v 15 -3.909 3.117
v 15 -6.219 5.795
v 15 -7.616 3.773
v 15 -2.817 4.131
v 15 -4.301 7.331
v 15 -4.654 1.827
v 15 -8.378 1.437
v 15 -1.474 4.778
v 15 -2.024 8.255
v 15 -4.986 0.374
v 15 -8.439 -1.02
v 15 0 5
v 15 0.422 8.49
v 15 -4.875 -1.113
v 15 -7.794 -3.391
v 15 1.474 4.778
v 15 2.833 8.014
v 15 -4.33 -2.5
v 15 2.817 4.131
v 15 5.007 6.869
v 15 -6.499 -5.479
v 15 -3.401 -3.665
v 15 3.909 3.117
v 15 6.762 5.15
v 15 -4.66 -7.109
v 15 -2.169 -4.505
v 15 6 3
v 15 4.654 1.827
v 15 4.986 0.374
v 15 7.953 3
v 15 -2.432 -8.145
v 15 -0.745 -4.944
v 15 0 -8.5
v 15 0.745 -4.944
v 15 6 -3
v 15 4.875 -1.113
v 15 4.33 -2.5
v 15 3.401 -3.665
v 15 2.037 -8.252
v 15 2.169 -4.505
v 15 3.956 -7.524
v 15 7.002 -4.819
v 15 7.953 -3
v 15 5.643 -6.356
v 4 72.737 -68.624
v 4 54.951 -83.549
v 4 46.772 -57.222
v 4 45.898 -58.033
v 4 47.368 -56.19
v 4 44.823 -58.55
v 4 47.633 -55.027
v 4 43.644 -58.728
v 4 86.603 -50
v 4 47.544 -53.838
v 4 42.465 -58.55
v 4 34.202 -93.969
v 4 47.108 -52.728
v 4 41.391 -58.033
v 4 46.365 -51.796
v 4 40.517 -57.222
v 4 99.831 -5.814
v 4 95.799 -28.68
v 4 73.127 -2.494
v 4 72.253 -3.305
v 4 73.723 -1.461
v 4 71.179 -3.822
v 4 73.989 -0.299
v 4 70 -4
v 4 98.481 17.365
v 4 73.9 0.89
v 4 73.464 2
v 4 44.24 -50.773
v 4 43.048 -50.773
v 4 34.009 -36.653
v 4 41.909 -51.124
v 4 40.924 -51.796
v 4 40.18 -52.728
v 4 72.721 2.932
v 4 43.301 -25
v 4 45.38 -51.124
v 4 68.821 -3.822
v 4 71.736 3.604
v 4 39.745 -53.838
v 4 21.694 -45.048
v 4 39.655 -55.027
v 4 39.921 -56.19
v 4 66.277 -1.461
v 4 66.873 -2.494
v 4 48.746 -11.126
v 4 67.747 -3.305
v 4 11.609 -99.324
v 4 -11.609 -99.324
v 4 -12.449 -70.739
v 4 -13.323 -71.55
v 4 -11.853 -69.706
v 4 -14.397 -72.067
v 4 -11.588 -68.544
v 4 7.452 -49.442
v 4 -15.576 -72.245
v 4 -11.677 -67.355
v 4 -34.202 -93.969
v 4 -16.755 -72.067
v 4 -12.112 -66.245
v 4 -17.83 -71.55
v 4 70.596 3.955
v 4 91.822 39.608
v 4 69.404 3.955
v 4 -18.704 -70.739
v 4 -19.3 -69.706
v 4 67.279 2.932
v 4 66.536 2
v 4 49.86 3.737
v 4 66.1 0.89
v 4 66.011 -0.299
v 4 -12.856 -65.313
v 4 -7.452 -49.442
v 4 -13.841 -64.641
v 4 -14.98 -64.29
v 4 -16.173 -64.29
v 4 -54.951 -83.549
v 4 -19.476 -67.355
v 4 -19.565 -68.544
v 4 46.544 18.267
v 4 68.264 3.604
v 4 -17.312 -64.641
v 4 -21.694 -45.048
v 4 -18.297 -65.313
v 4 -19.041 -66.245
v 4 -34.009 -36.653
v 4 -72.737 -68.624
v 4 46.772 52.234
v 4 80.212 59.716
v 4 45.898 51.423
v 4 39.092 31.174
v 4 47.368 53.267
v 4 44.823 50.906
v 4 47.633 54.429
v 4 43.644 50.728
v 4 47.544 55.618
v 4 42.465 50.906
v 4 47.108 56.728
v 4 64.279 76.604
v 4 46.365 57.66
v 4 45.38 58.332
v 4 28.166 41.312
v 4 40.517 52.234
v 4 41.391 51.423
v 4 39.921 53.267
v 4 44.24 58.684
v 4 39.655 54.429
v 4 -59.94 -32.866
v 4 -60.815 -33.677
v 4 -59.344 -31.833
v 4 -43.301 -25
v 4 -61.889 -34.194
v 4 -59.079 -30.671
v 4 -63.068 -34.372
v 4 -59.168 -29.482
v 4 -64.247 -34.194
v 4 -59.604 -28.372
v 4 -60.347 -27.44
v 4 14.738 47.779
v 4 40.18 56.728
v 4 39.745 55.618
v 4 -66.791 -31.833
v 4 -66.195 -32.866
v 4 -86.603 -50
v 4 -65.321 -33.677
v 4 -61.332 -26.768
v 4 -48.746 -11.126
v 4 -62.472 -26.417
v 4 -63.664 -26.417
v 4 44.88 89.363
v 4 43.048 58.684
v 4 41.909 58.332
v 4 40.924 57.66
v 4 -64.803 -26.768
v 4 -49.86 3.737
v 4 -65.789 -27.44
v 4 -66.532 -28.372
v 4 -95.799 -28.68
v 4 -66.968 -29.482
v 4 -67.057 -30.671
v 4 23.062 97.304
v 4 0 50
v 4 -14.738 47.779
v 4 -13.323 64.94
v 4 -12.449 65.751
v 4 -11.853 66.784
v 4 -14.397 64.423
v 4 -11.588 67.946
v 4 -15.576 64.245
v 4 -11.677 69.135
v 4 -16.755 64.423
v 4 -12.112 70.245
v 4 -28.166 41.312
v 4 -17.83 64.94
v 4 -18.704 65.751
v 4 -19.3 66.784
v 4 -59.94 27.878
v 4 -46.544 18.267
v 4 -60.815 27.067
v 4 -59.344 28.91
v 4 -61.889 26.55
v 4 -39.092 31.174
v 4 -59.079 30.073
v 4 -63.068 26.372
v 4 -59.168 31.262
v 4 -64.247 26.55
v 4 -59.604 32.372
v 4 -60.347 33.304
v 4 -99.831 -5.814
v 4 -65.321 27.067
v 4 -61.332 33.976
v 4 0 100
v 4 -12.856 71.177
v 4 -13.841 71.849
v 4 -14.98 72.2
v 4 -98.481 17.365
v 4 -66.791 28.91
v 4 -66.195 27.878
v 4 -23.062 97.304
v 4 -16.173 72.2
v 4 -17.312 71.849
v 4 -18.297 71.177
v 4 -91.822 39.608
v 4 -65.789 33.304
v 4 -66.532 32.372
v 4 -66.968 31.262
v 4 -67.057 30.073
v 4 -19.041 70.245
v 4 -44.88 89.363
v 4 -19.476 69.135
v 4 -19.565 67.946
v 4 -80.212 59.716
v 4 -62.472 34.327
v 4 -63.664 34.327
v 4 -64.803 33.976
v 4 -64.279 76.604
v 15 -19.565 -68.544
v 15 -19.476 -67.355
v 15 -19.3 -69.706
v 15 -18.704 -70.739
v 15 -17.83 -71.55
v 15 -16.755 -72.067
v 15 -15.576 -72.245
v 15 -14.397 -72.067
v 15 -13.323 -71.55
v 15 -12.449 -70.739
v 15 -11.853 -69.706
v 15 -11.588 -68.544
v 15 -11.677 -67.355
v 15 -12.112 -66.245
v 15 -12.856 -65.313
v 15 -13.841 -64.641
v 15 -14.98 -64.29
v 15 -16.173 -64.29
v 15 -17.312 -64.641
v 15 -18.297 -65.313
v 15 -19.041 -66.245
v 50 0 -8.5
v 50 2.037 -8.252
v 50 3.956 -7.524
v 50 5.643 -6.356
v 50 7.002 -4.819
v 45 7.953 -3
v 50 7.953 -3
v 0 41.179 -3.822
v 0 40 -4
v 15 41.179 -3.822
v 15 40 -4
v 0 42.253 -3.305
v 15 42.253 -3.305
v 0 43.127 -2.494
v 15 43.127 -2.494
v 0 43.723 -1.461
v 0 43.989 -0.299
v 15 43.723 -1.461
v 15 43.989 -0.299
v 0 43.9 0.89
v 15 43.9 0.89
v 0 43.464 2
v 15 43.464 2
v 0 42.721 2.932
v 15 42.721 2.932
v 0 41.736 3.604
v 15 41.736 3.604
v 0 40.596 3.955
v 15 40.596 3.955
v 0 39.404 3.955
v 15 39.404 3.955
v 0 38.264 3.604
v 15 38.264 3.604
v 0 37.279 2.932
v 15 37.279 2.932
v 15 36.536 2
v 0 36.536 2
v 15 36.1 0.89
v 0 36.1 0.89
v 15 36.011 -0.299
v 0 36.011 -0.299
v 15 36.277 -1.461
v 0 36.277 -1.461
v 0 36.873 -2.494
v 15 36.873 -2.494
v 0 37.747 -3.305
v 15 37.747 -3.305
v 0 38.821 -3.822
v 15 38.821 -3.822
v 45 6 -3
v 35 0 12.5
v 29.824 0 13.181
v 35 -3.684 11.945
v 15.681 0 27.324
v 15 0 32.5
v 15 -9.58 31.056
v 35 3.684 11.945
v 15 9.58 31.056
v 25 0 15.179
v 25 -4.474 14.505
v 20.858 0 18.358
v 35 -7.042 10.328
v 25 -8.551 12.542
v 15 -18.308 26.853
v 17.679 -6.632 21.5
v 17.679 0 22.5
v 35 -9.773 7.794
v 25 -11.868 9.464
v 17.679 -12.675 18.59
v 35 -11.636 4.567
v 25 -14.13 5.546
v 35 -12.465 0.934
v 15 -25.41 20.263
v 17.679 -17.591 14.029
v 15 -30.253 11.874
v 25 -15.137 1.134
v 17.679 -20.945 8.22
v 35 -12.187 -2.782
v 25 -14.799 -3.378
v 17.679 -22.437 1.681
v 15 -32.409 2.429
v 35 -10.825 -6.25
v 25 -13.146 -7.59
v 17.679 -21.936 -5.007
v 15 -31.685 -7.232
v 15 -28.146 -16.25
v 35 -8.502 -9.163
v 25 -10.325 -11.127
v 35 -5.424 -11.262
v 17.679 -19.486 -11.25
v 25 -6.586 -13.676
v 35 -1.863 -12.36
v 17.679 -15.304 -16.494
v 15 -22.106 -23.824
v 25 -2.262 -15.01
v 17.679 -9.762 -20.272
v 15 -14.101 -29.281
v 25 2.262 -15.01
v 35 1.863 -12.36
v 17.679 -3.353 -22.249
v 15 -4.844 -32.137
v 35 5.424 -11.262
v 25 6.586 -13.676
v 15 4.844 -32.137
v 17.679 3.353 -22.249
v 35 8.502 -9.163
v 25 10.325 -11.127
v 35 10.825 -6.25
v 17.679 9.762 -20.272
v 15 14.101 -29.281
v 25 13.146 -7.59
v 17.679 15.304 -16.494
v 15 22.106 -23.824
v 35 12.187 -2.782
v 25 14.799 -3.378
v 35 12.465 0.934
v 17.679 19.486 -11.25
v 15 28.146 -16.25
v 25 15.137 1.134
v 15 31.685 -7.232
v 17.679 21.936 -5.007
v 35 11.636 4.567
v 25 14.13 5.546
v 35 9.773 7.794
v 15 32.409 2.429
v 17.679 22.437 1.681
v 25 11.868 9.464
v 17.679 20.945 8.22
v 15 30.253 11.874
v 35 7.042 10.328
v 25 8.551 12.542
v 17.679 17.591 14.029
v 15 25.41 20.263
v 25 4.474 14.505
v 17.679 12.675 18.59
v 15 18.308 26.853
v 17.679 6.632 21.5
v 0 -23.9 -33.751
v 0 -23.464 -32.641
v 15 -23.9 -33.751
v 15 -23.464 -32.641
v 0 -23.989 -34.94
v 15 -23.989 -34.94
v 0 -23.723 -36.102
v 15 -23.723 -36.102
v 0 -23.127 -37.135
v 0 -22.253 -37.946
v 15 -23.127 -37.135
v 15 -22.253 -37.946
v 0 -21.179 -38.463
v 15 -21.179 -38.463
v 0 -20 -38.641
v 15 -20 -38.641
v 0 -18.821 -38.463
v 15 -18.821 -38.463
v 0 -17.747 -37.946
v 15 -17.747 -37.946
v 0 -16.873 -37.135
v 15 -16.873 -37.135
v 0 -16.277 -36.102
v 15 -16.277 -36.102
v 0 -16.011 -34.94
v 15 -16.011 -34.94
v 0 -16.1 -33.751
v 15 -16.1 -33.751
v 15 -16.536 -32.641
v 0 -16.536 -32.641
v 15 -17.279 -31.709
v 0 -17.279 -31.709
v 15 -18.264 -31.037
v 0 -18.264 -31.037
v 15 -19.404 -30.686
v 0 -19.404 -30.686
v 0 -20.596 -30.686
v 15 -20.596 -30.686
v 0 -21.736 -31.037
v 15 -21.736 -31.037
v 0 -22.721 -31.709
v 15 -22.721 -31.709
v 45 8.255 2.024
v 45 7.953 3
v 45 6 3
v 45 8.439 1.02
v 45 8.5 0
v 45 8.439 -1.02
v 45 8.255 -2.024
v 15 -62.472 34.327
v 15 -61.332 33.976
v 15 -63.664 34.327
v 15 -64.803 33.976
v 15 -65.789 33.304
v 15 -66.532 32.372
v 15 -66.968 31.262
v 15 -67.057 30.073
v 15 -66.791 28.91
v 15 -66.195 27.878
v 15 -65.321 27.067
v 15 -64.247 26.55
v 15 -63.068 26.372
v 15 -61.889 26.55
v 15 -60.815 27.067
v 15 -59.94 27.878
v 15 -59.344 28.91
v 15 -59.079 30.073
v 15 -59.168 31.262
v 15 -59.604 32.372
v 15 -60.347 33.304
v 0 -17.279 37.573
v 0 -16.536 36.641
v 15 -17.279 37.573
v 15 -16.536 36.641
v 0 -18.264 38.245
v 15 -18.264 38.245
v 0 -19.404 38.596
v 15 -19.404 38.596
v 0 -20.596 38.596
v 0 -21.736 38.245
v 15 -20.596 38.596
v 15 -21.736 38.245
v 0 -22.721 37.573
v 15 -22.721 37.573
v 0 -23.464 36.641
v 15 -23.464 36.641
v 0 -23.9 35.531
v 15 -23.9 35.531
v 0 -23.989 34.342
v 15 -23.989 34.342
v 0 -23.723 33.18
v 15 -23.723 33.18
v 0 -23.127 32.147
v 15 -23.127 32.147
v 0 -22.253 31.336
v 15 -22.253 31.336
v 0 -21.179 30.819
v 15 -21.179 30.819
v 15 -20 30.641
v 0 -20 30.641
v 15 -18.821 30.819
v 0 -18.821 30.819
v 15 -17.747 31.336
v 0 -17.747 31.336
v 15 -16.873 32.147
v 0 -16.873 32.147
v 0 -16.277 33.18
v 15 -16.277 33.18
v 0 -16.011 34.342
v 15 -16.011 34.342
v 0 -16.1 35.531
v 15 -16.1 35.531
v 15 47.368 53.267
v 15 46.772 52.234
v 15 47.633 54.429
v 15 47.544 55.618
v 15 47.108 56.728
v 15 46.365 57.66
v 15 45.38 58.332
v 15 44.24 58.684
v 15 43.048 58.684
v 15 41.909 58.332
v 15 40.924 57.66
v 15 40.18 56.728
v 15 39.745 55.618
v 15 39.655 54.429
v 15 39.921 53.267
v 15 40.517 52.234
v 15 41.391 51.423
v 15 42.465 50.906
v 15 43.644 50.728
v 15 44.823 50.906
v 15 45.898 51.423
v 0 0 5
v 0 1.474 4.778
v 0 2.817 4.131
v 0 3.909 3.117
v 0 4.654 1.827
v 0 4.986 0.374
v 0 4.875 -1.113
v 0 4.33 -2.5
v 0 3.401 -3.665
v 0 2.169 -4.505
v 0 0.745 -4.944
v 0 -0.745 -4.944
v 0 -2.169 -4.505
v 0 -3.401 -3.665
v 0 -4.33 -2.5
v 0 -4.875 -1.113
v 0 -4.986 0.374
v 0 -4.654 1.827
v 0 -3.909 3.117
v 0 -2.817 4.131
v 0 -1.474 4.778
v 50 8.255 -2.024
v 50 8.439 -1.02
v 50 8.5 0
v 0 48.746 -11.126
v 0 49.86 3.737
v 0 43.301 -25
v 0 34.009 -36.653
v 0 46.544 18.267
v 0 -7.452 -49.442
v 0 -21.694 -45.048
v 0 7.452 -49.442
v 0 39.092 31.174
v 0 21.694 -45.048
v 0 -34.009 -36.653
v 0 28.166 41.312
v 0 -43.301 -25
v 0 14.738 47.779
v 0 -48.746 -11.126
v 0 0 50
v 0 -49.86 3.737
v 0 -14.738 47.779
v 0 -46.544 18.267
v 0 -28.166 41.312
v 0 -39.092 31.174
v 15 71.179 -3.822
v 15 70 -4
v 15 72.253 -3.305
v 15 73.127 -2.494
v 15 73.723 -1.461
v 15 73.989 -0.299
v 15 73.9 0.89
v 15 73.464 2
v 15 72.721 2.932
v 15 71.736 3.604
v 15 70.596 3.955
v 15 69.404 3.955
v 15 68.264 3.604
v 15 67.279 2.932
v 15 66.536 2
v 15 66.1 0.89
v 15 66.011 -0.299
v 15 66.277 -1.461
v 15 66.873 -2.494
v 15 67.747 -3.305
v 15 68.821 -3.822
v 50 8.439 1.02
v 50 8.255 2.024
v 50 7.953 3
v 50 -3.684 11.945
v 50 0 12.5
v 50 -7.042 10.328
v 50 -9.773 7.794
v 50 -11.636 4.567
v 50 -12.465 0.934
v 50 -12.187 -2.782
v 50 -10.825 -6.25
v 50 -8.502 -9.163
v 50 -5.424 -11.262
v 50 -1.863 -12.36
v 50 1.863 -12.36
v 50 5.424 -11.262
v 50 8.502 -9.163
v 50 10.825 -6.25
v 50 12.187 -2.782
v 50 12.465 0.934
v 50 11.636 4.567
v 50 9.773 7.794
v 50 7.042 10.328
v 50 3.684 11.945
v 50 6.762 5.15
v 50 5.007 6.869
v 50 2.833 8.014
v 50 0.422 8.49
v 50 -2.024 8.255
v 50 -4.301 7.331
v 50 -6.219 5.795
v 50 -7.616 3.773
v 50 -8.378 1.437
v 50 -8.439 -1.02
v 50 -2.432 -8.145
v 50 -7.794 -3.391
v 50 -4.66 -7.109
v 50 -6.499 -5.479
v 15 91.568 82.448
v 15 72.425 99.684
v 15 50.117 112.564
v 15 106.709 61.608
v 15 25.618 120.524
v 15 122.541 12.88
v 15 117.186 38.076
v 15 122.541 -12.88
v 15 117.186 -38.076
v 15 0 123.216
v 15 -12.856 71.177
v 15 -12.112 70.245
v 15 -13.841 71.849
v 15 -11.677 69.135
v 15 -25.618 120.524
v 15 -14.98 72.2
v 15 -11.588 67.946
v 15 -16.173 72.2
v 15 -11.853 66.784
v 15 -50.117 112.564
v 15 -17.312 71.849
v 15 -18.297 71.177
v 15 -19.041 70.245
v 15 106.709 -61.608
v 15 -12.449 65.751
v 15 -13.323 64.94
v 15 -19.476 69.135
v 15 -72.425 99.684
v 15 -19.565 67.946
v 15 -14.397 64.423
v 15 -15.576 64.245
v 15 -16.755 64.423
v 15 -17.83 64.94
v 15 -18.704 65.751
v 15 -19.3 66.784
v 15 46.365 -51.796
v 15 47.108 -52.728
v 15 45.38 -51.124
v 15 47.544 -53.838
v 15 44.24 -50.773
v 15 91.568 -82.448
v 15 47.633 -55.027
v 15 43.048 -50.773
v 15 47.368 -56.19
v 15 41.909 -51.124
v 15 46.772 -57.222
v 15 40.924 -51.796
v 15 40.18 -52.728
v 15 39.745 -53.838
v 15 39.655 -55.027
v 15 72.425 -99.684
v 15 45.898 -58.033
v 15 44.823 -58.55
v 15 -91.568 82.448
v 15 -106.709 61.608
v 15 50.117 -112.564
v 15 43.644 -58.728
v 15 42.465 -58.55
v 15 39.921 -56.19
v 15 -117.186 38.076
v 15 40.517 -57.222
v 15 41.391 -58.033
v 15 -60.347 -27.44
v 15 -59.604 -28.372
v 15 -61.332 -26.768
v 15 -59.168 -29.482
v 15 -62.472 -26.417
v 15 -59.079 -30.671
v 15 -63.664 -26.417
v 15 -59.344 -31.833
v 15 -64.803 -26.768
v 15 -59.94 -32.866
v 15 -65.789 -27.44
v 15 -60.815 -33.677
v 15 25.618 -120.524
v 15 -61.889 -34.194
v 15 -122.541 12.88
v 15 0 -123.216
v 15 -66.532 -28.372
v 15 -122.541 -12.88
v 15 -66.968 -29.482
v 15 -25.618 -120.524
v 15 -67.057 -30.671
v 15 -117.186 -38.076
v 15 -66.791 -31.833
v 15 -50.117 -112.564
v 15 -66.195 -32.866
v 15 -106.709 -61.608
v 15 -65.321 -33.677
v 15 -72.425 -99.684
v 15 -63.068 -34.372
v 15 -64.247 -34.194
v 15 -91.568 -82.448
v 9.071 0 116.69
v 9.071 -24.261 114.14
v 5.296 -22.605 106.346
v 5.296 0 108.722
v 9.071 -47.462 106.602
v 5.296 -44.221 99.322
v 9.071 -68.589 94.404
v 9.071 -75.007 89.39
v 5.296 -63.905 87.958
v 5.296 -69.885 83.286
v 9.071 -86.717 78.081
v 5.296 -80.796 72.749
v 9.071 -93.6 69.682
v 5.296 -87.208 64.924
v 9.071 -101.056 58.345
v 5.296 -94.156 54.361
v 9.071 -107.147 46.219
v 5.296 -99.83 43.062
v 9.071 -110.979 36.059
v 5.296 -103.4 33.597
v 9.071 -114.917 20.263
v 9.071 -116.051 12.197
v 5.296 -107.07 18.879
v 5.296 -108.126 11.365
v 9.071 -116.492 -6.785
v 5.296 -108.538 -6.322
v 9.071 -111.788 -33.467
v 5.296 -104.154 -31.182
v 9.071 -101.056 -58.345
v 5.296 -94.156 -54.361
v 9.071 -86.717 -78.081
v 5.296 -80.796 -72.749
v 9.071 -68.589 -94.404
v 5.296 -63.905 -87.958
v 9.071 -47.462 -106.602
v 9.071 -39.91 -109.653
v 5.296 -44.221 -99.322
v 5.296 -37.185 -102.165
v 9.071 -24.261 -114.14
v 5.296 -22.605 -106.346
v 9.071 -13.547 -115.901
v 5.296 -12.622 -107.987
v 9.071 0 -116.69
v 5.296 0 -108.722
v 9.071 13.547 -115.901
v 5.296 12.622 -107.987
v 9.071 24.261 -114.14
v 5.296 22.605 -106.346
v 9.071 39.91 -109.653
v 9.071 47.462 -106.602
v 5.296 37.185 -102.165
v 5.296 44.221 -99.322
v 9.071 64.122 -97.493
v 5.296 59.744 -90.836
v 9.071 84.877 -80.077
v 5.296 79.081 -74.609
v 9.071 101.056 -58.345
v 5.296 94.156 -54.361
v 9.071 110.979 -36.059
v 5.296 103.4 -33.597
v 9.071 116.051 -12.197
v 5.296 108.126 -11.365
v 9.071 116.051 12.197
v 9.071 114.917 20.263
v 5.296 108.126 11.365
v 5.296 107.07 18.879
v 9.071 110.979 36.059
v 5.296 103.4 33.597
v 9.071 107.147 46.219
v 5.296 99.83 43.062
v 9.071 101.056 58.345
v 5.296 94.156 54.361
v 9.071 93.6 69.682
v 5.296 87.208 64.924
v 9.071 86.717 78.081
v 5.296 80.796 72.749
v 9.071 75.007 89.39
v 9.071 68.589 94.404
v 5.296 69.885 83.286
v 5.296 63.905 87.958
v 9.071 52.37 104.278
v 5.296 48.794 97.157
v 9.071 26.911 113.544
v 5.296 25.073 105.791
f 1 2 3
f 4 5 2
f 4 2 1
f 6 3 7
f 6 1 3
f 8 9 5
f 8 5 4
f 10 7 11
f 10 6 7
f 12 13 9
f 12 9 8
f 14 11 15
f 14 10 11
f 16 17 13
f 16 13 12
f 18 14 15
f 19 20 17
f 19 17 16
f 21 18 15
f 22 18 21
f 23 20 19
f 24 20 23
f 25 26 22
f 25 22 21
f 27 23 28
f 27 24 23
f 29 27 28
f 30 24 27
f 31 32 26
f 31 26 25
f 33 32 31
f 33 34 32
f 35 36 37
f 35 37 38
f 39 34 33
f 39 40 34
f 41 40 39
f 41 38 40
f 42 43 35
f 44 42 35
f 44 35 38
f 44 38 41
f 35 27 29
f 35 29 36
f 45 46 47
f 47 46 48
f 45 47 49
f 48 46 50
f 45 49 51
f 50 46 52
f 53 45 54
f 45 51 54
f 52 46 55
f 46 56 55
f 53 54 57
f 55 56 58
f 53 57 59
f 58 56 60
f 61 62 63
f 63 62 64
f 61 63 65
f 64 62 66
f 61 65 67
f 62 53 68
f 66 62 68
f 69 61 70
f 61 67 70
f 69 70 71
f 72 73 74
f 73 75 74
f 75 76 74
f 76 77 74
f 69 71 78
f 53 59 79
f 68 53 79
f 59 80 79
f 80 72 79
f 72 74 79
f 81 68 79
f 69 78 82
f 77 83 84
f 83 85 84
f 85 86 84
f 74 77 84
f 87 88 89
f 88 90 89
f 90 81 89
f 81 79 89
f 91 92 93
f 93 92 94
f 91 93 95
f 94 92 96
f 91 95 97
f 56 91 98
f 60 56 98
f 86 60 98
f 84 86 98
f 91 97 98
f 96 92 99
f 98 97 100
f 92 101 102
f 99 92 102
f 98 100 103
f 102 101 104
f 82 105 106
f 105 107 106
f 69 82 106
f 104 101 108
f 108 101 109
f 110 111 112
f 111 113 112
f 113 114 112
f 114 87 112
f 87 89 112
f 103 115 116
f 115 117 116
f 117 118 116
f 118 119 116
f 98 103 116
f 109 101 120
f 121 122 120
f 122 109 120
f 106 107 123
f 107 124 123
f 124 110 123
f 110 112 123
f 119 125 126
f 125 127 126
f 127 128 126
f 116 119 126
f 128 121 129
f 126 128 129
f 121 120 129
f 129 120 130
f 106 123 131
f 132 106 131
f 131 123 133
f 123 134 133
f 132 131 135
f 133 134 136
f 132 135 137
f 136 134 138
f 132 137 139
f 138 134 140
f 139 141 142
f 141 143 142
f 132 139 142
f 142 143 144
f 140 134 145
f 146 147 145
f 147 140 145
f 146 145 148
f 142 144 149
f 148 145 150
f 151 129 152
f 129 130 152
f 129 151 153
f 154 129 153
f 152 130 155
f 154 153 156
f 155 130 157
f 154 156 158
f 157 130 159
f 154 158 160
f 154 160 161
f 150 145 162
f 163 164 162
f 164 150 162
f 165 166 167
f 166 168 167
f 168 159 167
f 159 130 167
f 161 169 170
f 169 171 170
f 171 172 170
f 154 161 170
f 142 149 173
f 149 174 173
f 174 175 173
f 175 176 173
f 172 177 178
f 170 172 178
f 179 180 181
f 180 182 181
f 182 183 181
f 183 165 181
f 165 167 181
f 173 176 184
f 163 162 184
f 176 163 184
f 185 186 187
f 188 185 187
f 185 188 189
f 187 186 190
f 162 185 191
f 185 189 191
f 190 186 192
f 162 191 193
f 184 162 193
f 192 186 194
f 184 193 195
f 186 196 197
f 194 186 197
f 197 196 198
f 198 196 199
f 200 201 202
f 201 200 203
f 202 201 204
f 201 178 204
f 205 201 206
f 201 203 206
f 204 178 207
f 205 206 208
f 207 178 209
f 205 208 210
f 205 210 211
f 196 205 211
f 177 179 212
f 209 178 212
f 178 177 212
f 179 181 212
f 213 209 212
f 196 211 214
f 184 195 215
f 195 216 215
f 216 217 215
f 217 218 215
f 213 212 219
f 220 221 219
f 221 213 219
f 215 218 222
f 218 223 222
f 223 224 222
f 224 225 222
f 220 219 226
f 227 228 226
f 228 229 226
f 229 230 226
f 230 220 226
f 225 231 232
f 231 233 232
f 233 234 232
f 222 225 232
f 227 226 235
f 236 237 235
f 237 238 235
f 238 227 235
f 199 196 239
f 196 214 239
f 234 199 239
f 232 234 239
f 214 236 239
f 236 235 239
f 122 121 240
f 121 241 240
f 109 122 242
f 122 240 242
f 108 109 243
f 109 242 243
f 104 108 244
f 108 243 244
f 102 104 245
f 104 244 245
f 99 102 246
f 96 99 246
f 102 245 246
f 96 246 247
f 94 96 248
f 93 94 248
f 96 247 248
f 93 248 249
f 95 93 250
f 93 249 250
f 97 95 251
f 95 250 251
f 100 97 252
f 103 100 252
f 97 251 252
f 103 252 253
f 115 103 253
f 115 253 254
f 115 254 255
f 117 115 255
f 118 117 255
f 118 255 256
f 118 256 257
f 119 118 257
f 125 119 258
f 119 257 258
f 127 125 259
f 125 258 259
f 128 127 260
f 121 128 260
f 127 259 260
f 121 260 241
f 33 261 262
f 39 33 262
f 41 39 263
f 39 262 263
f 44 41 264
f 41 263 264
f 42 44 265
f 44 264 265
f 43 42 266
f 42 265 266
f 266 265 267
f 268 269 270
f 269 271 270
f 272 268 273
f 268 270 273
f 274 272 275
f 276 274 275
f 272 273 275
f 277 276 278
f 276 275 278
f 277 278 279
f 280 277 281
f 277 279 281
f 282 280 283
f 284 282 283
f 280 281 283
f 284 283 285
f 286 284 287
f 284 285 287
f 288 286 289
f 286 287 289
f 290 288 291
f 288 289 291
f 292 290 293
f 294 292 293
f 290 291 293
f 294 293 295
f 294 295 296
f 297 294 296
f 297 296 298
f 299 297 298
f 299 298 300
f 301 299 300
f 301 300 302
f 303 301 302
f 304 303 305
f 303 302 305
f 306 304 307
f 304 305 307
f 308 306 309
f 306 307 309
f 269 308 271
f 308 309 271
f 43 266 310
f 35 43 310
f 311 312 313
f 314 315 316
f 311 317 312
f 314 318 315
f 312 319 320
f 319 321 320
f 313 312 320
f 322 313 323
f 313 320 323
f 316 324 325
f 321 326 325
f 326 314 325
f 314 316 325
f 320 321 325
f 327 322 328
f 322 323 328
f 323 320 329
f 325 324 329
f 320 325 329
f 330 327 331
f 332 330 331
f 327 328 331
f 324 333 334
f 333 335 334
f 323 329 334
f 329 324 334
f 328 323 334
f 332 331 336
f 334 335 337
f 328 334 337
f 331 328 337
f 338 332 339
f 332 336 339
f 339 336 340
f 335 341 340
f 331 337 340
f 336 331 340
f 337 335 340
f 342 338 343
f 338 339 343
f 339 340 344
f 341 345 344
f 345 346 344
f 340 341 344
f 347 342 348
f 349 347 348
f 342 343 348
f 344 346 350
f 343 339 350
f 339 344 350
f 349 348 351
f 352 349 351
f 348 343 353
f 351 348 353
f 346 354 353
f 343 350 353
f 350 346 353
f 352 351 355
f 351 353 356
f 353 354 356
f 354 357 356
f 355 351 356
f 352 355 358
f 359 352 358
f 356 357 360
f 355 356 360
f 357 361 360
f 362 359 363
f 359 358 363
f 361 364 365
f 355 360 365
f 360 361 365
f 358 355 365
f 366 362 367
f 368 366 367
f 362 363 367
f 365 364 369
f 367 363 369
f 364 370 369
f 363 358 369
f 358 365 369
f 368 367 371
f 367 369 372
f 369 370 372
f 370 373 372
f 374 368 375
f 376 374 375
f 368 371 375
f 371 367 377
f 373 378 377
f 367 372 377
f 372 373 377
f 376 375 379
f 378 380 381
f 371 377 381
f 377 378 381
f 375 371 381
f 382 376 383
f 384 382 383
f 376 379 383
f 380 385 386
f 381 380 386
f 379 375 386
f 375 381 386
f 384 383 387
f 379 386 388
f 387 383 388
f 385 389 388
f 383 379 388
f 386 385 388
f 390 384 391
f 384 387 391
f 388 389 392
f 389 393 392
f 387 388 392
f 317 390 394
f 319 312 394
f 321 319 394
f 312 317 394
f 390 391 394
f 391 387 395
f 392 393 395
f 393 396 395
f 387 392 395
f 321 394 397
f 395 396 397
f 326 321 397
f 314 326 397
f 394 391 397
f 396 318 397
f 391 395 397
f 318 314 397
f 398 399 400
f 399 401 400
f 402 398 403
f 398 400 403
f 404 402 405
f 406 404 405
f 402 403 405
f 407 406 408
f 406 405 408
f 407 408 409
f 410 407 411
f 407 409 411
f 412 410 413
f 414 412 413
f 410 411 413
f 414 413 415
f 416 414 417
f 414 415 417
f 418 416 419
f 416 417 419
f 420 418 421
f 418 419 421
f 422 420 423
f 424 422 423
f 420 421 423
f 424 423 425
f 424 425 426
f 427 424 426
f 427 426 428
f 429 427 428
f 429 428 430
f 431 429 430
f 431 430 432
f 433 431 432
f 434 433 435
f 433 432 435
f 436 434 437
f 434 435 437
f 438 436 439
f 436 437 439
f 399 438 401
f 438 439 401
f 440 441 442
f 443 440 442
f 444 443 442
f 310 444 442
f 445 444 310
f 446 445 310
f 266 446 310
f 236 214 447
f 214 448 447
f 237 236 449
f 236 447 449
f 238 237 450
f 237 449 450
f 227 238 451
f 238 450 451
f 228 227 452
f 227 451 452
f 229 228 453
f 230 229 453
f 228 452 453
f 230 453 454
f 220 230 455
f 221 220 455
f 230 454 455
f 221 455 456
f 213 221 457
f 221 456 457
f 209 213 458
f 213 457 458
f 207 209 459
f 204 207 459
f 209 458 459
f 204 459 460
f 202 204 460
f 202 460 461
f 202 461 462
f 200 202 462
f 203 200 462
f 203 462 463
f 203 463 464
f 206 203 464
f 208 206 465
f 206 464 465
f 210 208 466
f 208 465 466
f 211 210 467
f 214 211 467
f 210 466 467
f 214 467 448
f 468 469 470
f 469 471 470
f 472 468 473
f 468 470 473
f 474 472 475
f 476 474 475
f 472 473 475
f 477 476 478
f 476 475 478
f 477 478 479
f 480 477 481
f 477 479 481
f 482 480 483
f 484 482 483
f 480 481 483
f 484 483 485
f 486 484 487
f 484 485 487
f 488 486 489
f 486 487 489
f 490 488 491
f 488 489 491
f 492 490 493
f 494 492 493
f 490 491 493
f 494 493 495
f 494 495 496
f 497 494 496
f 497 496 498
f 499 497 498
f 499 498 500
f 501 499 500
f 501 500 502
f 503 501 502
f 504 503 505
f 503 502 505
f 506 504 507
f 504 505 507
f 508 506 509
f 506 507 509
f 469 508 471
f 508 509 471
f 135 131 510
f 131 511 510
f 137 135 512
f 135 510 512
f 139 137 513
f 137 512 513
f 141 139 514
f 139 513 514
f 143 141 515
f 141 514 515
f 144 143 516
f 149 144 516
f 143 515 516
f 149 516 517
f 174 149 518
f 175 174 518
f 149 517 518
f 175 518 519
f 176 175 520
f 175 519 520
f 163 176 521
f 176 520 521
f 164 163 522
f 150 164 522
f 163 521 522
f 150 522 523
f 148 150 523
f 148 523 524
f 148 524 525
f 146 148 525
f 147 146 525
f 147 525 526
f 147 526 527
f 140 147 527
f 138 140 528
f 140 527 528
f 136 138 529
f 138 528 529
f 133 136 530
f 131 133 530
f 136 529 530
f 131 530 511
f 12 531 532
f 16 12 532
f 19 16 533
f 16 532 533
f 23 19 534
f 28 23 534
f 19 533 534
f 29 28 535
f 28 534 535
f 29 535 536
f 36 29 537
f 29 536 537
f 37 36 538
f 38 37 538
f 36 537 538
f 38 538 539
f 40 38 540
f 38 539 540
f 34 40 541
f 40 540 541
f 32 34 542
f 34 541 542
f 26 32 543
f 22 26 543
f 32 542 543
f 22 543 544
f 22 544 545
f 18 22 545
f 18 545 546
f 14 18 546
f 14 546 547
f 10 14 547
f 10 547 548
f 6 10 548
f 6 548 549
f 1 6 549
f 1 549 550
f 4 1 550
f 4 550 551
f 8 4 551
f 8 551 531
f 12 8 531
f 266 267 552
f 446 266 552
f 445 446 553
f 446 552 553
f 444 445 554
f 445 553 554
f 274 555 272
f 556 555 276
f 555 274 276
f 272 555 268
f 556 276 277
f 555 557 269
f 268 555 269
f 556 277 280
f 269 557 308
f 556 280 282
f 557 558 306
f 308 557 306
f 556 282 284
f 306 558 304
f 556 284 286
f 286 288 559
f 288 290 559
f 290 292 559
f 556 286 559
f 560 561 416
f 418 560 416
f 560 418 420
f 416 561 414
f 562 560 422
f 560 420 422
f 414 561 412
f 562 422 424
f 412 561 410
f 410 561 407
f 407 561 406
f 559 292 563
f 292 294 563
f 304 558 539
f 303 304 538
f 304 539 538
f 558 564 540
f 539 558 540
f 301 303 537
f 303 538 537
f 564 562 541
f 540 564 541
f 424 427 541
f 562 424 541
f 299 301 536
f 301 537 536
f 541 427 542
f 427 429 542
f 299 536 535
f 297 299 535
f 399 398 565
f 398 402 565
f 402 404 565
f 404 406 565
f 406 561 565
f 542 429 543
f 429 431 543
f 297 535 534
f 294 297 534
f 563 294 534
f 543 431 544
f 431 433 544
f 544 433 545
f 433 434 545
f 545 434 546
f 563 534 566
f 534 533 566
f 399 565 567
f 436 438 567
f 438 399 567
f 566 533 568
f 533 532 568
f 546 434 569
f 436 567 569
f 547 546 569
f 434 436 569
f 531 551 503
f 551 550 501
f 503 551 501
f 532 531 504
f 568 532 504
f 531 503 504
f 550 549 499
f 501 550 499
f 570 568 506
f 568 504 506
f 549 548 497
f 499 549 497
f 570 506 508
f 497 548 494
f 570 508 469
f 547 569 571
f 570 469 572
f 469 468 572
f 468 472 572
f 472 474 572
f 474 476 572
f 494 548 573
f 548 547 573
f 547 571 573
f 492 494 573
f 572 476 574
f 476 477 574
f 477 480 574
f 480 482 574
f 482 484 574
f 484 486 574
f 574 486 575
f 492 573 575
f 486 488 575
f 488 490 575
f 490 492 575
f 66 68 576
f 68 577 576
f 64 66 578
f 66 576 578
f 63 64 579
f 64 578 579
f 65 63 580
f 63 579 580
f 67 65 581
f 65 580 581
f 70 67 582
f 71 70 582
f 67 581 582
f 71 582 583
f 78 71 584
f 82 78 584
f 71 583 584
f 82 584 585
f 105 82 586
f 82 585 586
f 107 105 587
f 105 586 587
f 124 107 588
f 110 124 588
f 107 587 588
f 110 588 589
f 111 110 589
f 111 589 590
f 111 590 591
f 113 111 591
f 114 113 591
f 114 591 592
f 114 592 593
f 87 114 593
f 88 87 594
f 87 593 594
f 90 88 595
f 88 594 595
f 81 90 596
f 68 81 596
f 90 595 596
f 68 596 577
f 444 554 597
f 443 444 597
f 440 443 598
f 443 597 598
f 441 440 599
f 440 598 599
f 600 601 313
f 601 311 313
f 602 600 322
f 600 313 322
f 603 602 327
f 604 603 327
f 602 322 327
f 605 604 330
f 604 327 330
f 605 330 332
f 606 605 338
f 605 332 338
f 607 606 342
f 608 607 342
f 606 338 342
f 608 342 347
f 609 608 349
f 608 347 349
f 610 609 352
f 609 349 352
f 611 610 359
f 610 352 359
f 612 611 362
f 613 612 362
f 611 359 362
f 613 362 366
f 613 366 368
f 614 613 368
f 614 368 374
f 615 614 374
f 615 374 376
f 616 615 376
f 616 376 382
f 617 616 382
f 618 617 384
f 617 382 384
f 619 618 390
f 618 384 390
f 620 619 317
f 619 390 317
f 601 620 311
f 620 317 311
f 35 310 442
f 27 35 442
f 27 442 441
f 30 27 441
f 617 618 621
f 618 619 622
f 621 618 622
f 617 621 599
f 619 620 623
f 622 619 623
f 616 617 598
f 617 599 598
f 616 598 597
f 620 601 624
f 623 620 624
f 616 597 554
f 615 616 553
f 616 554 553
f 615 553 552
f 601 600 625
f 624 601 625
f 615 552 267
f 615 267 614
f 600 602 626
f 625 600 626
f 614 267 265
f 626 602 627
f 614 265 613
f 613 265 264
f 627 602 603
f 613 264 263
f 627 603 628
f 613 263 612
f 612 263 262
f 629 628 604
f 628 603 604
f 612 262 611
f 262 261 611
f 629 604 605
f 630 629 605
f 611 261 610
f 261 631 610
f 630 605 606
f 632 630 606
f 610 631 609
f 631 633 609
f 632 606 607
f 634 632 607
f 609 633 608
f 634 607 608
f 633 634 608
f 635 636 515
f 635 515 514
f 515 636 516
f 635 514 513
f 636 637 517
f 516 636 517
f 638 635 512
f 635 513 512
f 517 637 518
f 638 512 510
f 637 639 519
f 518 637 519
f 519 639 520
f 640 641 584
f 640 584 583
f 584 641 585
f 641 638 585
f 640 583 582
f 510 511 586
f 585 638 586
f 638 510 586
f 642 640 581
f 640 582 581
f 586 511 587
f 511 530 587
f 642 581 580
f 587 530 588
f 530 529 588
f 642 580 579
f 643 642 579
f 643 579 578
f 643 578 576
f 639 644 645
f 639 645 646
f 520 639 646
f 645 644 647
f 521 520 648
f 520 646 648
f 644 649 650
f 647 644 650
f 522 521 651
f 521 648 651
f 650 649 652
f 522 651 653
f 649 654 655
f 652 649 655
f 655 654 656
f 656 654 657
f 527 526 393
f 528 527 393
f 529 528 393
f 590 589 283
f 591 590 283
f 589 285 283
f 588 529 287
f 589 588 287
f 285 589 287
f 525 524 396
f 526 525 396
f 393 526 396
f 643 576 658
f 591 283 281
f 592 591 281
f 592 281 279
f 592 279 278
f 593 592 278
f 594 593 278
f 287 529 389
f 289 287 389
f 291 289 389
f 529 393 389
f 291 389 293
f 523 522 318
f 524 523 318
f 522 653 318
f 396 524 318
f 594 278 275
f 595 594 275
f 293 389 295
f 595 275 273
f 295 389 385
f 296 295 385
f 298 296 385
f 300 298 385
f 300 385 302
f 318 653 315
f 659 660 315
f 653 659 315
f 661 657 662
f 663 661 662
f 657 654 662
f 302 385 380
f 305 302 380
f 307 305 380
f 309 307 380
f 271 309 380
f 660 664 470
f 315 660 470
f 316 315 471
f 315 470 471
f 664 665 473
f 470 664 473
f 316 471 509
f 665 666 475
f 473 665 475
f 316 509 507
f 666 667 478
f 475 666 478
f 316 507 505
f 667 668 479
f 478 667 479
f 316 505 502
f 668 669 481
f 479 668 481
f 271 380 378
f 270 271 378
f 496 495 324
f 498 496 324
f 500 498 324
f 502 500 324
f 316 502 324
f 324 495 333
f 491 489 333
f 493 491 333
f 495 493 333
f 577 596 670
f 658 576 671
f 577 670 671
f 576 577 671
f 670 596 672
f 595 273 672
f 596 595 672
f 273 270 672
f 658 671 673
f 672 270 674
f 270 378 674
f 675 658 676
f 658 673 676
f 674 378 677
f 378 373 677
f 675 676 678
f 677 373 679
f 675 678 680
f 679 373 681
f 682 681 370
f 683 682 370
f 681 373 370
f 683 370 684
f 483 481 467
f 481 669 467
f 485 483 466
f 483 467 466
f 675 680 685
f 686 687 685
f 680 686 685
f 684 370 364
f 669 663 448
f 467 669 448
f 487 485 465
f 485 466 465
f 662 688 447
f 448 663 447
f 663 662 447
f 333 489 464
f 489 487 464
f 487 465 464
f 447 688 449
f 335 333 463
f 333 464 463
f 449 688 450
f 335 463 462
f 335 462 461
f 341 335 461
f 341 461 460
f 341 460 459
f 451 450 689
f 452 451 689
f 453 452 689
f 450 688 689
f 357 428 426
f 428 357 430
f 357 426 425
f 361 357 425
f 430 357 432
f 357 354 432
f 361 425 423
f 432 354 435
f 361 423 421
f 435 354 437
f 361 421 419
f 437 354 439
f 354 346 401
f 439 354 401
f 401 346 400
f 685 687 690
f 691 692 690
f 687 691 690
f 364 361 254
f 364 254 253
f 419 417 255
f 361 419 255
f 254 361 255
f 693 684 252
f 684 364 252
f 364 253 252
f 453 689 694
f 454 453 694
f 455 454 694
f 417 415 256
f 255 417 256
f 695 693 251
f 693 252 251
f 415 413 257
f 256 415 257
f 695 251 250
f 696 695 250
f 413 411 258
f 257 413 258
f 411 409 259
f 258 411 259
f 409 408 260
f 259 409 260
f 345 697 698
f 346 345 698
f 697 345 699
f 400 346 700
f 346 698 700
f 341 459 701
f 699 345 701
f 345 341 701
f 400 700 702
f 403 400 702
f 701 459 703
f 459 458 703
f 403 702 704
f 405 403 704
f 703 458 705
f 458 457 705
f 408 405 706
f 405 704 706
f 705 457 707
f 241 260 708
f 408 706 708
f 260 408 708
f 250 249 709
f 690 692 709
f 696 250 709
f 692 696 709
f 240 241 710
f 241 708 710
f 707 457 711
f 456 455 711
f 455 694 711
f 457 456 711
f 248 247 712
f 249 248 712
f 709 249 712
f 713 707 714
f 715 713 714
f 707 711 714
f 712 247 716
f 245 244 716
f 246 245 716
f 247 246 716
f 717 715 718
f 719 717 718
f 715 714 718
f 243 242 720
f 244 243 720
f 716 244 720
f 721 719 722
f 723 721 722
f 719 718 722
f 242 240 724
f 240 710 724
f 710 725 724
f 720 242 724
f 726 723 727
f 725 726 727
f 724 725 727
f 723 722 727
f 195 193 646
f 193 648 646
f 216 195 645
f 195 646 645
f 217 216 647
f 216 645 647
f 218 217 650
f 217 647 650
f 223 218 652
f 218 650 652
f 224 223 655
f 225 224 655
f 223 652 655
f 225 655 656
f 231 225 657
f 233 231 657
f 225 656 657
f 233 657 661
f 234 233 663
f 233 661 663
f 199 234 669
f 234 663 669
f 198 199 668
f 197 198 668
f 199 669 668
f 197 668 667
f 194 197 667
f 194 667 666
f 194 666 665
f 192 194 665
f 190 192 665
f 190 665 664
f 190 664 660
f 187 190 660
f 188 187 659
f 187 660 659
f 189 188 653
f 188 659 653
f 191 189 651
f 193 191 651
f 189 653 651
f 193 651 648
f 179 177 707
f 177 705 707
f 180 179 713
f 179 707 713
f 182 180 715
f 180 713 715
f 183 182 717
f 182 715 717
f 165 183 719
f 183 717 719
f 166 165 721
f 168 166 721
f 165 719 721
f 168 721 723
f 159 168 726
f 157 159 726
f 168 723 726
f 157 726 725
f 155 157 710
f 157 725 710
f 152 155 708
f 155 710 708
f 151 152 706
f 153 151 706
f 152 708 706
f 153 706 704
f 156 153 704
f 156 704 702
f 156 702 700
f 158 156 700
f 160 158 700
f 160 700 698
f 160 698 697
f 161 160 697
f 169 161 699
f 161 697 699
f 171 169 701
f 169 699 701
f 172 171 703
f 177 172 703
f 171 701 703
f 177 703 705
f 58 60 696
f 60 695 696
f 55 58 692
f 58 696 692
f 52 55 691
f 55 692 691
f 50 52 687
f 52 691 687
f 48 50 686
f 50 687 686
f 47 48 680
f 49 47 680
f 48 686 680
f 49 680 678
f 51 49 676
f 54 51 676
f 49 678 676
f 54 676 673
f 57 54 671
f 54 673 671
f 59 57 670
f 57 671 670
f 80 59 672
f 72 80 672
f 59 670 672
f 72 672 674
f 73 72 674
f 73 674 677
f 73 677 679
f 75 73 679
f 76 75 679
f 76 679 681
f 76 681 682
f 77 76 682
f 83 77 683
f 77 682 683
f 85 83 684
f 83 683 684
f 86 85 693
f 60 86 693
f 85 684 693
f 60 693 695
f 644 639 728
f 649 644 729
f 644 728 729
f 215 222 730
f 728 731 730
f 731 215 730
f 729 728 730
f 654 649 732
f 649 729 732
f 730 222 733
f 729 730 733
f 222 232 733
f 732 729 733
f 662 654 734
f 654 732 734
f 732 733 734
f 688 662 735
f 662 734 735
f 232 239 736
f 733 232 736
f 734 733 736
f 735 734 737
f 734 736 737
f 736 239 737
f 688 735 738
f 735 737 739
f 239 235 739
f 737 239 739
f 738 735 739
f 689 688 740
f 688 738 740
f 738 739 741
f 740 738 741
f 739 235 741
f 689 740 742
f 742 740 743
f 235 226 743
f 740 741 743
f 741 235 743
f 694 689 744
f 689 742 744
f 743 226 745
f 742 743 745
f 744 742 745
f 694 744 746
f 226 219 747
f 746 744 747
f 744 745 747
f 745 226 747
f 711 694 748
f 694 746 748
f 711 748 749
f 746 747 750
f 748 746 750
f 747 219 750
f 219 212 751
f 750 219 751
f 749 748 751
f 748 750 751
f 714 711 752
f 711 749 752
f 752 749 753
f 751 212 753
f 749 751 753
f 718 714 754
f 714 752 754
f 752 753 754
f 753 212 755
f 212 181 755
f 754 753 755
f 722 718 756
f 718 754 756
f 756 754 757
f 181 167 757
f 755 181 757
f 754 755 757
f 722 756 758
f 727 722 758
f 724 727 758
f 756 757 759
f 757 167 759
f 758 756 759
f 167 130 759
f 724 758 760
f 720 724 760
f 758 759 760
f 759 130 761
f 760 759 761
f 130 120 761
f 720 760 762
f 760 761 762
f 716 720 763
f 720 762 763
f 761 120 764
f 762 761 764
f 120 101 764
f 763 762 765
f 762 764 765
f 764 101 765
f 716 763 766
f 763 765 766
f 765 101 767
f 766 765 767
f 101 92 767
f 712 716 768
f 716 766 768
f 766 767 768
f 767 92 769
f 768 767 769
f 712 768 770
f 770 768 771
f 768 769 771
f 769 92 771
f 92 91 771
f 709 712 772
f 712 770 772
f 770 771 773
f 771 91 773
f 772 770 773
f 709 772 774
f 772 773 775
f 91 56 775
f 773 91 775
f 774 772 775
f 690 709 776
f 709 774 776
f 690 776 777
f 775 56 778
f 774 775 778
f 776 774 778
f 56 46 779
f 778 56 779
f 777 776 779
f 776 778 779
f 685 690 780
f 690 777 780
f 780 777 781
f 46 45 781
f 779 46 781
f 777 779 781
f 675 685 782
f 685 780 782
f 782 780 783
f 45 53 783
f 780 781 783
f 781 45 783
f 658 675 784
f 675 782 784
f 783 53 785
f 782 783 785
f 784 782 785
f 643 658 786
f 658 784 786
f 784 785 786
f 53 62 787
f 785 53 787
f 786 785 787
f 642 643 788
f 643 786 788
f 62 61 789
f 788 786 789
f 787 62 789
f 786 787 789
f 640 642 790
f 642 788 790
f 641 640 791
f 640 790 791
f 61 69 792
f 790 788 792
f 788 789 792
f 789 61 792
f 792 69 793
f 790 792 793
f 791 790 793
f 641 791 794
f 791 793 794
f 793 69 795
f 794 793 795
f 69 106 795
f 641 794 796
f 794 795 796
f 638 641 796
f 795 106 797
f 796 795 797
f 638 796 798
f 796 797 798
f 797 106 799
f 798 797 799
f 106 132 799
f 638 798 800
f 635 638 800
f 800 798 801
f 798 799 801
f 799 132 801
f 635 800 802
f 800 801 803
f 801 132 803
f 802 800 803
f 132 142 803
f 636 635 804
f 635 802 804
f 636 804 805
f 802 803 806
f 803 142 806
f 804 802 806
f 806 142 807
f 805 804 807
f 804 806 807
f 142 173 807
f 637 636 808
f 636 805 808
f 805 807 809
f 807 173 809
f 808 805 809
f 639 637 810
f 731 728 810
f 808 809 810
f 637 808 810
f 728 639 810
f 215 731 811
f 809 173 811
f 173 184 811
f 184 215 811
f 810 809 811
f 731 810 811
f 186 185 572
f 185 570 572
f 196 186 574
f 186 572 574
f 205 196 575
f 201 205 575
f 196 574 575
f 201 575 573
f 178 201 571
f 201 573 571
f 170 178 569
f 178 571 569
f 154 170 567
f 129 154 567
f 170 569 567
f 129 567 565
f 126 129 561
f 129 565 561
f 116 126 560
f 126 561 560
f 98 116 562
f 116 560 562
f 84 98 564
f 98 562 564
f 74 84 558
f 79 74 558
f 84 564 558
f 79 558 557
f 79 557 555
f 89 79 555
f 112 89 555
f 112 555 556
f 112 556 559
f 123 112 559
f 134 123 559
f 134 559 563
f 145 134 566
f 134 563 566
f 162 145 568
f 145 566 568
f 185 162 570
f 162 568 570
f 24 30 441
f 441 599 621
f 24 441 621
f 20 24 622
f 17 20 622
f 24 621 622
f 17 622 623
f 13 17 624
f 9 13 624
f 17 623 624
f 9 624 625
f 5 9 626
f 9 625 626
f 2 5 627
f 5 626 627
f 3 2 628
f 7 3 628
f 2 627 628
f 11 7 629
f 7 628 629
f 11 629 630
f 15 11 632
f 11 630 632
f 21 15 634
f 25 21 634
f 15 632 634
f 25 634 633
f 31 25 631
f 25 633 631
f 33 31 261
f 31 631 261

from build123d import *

# Parameters (mm, degrees)
CUT_EXTRUDE_1_DEPTH      = 35
CUT_EXTRUDE_3_DEPTH      = 5
SKETCH_5_R               = 5
CUT_EXTRUDE_4_DEPTH      = 25
SKETCH_6_R               = 4
CUT_EXTRUDE_5_DEPTH      = 178.734491343
PATTERN_CIRCULAR_1_COUNT = 7
SKETCH_7_R               = 4
CUT_EXTRUDE_6_DEPTH      = 178.734491343
PATTERN_CIRCULAR_2_COUNT = 3


with BuildPart() as part:
    # 草图1 → 旋转1 (revolve)
    with BuildSketch(Plane.XY):
        with BuildLine():
            Line((0, 0), (50, 0))
            Line((50, 0), (50, 12.5))
            Line((50, 12.5), (35, 12.5))
            ThreePointArc((35, 12.5), (20.857864376, 18.357864376), (15, 32.5))
            Line((15, 32.5), (15, 123.216373532))
            ThreePointArc((15, 123.216373532), (6.889116577, 112.845232579), (4, 100))
            Line((4, 100), (4, 50))
            Line((4, 50), (0, 50))
            Line((0, 50), (0, 0))
        make_face()
    revolve(axis=Axis((0, 0, 0), (1, 0, 0)))

    # 草图3 → 切除-拉伸1 (cut)
    with BuildSketch(Plane(origin=(50, 0, 0), x_dir=(0, 0, -1), z_dir=(1, 0, 0))):
        with BuildLine():
            Line((-3, 6), (-3, 7.95298686))
            ThreePointArc((-3, 7.95298686), (-4.834769901, -6.991065727), (8.5, 0))
            ThreePointArc((8.5, 0), (6.991065727, 4.834769901), (3, 7.95298686))
            Line((3, 7.95298686), (3, 6))
            Line((3, 6), (-3, 6))
        make_face()
    extrude(amount=-CUT_EXTRUDE_1_DEPTH, mode=Mode.SUBTRACT)

    # 草图3<4> → 切除-拉伸3 (cut)
    with BuildSketch(Plane(origin=(50, 0, 0), x_dir=(0, 0, -1), z_dir=(1, 0, 0))):
        with BuildLine():
            Line((-3, 7.95298686), (-3, 6))
            Line((-3, 6), (3, 6))
            Line((3, 6), (3, 7.95298686))
            ThreePointArc((3, 7.95298686), (0, 8.5), (-3, 7.95298686))
        make_face()
    extrude(amount=-CUT_EXTRUDE_3_DEPTH, mode=Mode.SUBTRACT)

    # 草图5 → 切除-拉伸4 (cut)
    with BuildSketch(Plane.ZY):
        Circle(SKETCH_5_R)
    extrude(amount=-CUT_EXTRUDE_4_DEPTH, mode=Mode.SUBTRACT)

    # 草图6 → 切除-拉伸5 (cut, symmetric)
    with BuildSketch(Plane(origin=(15, 0, 0), x_dir=(0, 0, -1), z_dir=(1, 0, 0))):
        with Locations((0, 70)):
            Circle(SKETCH_6_R)
    cut_extrude_5 = extrude(amount=CUT_EXTRUDE_5_DEPTH, both=True, mode=Mode.SUBTRACT)

    # 阵列(圆周)1: 切除-拉伸5 ×7 about axis
    pattern_circular_1_axis = Axis((35, 0, 0), (-1, 0, 0))
    for i in range(1, PATTERN_CIRCULAR_1_COUNT):
        add(cut_extrude_5.rotate(pattern_circular_1_axis, i * 360 / PATTERN_CIRCULAR_1_COUNT), mode=Mode.SUBTRACT)

    # 草图7 → 切除-拉伸6 (cut, symmetric)
    with BuildSketch(Plane(origin=(15, 0, 0), x_dir=(0, 0, -1), z_dir=(1, 0, 0))):
        with Locations((0, 40)):
            Circle(SKETCH_7_R)
    cut_extrude_6 = extrude(amount=CUT_EXTRUDE_6_DEPTH, both=True, mode=Mode.SUBTRACT)

    # 阵列(圆周)2: 切除-拉伸6 ×3 about axis
    pattern_circular_2_axis = Axis((50, 0, 0), (1, 0, 0))
    for i in range(1, PATTERN_CIRCULAR_2_COUNT):
        add(cut_extrude_6.rotate(pattern_circular_2_axis, i * 360 / PATTERN_CIRCULAR_2_COUNT), mode=Mode.SUBTRACT)


solid = part.part
